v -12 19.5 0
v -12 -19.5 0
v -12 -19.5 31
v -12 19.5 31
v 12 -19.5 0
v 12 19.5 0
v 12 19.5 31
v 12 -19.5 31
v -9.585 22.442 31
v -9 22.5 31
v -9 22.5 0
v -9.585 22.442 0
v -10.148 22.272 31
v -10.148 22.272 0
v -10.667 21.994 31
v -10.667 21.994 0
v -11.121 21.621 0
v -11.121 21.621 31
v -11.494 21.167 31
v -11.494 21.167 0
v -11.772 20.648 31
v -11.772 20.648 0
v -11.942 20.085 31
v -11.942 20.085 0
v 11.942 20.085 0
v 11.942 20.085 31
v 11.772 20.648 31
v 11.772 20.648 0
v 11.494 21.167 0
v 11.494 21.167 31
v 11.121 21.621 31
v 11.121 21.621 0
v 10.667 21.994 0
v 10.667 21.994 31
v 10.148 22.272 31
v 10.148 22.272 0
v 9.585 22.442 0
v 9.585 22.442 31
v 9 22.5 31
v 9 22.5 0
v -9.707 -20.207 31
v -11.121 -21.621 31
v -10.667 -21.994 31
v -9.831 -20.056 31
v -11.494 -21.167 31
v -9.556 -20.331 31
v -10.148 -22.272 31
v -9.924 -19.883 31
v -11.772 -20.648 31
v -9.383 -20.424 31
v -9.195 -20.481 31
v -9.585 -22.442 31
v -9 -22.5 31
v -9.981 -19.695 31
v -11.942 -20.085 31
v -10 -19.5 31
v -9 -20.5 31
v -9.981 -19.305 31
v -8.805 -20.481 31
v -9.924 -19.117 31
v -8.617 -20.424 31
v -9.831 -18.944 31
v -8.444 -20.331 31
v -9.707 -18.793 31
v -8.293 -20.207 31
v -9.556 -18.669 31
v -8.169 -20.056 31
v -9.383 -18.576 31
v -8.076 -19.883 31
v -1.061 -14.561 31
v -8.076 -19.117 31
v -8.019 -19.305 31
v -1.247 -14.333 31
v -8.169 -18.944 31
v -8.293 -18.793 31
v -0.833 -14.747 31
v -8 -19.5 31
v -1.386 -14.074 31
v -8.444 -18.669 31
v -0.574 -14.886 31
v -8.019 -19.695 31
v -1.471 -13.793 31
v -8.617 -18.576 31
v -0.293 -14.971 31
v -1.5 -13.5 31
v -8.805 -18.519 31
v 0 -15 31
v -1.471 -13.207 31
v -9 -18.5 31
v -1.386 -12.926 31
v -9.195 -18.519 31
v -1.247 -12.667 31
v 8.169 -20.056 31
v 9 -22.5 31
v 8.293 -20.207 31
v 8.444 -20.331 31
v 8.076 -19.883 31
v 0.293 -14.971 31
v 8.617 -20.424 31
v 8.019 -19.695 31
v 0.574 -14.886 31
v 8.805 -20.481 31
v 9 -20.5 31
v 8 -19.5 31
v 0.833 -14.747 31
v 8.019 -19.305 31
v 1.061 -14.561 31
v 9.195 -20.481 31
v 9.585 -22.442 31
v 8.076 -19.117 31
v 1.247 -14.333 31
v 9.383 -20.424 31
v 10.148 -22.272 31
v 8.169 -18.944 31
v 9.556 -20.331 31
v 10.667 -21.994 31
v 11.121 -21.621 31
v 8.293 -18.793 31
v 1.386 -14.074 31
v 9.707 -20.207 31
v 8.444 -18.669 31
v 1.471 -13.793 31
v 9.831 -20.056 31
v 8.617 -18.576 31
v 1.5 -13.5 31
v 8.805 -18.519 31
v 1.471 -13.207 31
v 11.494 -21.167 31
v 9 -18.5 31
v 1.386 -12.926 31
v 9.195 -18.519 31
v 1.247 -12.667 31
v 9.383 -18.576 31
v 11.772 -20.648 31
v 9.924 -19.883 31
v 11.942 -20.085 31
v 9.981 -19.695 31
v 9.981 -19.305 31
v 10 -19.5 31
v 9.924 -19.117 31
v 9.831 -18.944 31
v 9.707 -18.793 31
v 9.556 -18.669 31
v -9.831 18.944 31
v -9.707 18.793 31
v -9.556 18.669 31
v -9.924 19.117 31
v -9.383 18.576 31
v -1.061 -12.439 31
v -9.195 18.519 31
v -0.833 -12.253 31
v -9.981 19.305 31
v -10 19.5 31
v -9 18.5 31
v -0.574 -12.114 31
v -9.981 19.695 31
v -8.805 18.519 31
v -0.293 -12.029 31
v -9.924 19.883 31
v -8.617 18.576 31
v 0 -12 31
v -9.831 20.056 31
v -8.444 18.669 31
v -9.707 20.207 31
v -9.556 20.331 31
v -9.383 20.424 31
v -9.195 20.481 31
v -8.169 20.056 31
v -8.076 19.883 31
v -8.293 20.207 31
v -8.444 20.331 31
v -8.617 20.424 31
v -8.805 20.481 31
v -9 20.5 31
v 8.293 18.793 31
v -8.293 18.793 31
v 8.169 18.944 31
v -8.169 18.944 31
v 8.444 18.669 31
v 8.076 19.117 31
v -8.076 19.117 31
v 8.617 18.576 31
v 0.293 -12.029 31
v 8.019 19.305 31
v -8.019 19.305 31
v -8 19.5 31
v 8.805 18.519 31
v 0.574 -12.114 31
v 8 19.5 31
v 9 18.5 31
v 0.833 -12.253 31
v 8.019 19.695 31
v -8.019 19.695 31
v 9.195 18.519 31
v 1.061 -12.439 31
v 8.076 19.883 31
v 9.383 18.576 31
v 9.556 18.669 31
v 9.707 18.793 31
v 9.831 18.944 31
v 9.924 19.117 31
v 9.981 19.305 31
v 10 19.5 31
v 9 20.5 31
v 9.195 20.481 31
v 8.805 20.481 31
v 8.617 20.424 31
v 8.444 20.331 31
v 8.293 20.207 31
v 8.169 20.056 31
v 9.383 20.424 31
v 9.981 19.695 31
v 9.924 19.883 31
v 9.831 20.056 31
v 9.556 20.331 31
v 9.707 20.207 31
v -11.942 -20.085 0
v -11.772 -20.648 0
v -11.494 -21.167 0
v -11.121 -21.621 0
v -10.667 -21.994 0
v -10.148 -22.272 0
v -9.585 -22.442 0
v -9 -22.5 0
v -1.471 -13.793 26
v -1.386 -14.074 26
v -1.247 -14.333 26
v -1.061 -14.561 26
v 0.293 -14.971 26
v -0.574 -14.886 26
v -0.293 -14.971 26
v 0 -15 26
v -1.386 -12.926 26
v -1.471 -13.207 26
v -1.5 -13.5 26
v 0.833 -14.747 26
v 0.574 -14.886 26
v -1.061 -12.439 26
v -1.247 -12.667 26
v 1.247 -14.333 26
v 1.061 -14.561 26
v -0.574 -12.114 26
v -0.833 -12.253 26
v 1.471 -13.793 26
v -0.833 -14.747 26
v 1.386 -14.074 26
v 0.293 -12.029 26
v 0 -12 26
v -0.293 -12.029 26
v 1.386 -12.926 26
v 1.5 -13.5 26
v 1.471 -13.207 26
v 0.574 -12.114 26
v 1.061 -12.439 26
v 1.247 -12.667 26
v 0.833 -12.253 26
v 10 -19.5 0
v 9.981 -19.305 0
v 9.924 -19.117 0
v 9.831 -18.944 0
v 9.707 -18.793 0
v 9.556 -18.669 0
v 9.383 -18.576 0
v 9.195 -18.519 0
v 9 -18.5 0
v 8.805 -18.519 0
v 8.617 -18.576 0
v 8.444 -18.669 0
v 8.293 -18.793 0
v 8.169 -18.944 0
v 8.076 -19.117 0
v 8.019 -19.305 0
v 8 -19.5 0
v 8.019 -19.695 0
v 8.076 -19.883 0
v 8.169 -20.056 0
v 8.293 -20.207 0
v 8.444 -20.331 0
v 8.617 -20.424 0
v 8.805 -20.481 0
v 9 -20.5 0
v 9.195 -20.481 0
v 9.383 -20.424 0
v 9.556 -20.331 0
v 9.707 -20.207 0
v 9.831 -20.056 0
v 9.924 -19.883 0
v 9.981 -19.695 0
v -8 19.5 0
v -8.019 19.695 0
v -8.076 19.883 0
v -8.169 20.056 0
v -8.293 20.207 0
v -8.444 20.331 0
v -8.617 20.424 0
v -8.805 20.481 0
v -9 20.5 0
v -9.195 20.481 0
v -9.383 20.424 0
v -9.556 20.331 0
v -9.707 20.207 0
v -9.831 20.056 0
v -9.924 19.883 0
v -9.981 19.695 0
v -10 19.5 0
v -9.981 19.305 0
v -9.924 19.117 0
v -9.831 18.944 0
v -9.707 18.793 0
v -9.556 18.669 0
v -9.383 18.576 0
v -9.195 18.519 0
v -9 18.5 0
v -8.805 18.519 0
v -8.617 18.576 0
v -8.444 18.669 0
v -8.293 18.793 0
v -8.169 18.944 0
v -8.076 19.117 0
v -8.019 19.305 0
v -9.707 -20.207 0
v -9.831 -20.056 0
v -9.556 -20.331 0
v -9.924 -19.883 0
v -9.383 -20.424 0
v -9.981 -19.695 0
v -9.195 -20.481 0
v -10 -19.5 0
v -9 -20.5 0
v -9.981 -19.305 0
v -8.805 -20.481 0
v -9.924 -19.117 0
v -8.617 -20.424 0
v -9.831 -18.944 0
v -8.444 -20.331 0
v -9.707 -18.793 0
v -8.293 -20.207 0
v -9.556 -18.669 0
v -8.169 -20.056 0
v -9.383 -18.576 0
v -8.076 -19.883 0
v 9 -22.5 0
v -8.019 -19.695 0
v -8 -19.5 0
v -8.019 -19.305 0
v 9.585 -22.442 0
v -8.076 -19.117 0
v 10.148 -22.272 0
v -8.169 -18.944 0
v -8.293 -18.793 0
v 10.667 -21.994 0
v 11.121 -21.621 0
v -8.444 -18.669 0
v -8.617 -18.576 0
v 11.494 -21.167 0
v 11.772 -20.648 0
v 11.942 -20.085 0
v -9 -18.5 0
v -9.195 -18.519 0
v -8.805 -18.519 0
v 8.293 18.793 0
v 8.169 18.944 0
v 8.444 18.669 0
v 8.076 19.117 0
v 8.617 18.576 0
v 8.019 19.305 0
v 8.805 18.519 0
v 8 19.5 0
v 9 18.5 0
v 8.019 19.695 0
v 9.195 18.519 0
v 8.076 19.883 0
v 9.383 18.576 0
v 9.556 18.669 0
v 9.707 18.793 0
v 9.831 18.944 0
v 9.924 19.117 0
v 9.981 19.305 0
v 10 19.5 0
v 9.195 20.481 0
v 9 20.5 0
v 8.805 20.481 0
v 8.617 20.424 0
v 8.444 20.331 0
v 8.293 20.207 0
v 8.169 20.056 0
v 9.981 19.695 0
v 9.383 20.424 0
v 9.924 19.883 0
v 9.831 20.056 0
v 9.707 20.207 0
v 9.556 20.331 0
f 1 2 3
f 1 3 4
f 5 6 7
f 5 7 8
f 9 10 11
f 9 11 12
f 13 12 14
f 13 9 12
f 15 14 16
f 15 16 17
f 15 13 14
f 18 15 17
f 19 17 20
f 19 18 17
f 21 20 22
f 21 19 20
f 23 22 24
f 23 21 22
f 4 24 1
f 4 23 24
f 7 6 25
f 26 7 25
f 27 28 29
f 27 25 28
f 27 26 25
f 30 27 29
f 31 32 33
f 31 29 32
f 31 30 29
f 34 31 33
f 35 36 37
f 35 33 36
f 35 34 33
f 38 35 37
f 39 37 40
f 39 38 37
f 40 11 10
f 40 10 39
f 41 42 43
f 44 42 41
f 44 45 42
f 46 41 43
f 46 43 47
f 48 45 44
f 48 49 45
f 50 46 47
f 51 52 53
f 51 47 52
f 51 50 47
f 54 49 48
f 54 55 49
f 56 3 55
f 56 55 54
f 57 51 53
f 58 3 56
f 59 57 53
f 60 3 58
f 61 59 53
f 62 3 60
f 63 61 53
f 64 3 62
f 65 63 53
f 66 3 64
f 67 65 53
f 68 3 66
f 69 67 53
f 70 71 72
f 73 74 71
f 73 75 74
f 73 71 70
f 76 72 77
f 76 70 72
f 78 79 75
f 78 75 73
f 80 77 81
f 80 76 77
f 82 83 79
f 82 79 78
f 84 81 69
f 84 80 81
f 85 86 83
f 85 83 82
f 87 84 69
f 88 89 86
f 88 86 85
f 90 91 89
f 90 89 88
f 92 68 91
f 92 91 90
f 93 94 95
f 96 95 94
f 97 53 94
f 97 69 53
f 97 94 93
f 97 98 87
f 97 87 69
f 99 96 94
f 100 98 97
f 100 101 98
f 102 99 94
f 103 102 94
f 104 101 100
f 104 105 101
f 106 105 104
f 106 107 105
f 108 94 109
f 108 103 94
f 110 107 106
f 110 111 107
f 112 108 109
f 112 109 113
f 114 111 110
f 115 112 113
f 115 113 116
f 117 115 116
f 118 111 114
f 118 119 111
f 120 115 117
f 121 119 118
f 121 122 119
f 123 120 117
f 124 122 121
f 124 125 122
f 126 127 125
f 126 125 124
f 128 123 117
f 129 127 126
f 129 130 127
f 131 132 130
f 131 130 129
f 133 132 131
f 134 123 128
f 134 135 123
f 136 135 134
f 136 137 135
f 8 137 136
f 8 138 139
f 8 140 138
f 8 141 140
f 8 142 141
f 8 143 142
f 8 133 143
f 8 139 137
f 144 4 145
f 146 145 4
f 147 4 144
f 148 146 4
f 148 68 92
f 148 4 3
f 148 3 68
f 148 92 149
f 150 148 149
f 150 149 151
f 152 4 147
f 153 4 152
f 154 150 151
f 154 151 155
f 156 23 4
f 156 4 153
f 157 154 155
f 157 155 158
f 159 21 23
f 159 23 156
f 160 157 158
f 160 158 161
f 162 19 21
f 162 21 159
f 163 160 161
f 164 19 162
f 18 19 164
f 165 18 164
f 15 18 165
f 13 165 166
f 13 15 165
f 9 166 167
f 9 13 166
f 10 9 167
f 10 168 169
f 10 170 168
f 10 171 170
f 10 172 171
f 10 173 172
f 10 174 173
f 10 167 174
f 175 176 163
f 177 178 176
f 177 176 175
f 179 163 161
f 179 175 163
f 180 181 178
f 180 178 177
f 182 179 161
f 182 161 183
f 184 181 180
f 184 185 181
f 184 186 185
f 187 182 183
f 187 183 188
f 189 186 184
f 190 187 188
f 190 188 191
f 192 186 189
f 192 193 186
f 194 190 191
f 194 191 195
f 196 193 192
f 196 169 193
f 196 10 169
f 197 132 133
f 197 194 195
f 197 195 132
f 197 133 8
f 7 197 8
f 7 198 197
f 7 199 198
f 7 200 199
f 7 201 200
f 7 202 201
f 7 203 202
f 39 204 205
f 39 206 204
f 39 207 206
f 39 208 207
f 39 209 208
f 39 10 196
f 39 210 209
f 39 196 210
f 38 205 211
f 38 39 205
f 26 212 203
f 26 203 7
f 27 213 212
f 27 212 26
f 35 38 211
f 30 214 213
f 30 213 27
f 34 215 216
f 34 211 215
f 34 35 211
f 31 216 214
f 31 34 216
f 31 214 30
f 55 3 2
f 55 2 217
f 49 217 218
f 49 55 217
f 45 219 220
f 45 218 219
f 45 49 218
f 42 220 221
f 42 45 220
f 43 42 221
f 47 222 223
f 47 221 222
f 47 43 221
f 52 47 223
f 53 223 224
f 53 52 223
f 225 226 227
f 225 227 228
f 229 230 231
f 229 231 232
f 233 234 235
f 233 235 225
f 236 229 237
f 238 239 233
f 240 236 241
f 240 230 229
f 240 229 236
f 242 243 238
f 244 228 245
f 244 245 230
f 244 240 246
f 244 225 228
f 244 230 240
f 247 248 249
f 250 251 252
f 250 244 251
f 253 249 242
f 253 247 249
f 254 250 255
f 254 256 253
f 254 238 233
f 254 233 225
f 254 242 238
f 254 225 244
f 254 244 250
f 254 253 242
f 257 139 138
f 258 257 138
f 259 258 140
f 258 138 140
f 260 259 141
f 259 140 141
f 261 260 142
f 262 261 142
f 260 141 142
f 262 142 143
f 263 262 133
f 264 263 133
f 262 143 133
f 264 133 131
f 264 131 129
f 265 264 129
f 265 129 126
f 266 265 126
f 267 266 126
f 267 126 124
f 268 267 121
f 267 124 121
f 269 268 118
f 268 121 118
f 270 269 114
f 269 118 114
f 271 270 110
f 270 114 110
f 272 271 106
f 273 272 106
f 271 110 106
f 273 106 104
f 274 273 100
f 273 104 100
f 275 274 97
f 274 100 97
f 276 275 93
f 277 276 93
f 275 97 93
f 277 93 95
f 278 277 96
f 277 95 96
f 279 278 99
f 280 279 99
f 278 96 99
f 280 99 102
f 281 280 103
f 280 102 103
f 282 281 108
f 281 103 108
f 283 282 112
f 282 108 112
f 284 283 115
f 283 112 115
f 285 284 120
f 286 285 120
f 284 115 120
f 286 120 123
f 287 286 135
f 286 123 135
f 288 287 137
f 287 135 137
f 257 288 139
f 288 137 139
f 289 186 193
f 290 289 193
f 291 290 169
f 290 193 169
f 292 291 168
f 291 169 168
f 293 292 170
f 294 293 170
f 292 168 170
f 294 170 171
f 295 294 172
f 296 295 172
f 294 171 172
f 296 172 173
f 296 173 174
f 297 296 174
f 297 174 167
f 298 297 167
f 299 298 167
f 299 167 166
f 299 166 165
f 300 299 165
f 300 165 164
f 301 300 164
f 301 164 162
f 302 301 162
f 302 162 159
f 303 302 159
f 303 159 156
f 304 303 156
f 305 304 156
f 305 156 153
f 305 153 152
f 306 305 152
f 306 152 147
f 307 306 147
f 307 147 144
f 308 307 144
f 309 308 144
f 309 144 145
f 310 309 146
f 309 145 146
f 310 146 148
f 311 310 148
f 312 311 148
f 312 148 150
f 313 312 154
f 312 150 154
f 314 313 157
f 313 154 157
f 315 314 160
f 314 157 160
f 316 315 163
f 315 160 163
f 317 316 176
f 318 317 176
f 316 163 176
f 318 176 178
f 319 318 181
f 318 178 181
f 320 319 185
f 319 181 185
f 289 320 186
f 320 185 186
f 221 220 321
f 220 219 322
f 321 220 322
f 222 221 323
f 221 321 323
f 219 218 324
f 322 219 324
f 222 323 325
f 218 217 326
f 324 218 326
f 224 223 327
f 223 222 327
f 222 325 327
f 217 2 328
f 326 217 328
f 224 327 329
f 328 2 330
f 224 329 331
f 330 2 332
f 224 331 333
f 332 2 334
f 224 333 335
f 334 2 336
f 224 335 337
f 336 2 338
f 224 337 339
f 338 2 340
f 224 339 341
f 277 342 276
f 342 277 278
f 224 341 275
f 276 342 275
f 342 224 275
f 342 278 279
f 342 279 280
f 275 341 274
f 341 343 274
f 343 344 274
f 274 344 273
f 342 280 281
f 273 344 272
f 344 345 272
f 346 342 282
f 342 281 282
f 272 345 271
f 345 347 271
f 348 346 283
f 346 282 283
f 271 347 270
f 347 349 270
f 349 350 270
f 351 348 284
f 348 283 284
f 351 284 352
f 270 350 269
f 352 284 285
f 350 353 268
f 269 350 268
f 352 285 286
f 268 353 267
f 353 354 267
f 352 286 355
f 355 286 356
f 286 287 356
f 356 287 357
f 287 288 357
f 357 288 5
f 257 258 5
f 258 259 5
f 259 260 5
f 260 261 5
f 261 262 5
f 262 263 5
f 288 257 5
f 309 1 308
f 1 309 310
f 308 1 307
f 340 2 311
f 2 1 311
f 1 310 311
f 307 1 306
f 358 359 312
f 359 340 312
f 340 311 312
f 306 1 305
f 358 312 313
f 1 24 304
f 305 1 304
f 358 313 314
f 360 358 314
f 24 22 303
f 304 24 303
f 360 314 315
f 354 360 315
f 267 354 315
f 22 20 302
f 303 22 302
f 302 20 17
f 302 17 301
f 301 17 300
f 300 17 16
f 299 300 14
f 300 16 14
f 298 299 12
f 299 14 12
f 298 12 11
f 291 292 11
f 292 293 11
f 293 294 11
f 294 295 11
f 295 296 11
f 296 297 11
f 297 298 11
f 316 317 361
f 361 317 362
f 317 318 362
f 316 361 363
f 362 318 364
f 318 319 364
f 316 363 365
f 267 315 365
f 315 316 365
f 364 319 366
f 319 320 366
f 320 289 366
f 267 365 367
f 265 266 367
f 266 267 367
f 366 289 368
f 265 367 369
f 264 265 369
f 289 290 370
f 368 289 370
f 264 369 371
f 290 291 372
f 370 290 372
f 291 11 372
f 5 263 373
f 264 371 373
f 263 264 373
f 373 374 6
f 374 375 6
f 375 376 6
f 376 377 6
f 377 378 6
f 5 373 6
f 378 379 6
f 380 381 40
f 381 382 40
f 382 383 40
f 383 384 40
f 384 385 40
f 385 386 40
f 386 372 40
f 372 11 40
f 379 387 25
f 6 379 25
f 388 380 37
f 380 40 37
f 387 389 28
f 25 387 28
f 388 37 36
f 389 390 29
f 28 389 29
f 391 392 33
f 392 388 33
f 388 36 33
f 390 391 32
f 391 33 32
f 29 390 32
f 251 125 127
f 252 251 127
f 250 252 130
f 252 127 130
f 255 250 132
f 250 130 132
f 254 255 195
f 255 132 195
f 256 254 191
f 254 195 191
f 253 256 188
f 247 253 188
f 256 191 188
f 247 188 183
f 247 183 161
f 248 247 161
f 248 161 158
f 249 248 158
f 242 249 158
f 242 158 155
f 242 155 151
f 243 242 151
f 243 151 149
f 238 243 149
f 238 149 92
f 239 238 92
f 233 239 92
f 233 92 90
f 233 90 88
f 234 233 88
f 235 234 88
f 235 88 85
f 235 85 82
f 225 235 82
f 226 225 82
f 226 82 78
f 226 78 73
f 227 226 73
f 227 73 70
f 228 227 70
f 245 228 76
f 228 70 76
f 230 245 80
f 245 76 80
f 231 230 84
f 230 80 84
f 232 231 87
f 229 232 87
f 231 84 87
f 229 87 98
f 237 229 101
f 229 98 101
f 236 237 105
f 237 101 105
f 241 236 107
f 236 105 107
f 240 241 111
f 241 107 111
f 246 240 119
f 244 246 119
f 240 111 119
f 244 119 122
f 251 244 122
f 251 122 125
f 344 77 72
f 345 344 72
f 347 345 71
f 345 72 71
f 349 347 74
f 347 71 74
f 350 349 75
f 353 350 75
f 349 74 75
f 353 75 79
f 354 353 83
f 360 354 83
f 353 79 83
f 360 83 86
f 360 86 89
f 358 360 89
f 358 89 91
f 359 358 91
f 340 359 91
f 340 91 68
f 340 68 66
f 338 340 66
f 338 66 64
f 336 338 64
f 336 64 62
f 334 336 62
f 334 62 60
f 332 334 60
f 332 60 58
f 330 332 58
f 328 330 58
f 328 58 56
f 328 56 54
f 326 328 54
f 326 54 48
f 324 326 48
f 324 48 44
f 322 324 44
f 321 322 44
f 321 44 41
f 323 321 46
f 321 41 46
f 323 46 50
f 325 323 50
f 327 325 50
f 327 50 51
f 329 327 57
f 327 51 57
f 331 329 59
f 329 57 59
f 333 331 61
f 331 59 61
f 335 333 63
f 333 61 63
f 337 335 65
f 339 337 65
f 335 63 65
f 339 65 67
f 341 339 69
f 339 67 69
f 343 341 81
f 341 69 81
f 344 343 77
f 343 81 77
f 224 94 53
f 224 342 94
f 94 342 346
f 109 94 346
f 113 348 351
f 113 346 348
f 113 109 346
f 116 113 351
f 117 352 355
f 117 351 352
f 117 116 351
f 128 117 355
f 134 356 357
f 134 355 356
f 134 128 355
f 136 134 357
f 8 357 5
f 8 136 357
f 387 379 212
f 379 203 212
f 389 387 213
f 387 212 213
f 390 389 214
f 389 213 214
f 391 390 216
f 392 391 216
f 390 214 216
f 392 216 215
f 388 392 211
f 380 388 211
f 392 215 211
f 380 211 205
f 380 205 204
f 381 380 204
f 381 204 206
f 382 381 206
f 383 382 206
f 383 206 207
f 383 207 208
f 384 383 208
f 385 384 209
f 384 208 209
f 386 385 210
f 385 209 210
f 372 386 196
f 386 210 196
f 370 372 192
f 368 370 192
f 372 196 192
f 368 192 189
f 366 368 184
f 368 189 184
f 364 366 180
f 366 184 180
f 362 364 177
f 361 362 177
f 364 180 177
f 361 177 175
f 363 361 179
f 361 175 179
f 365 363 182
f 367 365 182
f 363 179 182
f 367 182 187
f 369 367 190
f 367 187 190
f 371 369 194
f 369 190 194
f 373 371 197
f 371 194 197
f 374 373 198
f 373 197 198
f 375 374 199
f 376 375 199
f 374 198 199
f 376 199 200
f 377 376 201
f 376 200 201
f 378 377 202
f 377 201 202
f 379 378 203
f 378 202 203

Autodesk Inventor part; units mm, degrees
ref_plane "YZ Plane" through (0, 0, 0) normal (1, 0, 0) x (0, 1, 0)
ref_plane "XZ Plane" through (0, 0, 0) normal (0, 1, 0) x (-1, 0, 0)
ref_plane "XY Plane" through (0, 0, 0) normal (0, 0, 1) x (1, 0, 0)
sketch "Sketch1" plane through (0, 0, 0) normal (0, 0, 1) x (1, 0, 0)
  line L0 (-12, 22.5) -> (12, 22.5)
  line L1 (12, 22.5) -> (12, -22.5)
  line L2 (12, -22.5) -> (-12, -22.5)
  line L3 (-12, -22.5) -> (-12, 22.5)
  point P0 (0, 0)
  point P1 (12, 0)
  point P2 (0, 22.5)
  dimension "d0" = 24
  dimension "d1" = 45
extrude "Extrusion1" add sketch "Sketch1" along normal blind 31
fillet "Fillet1" radius 3 4 edges at (12, 22.5, 15.5) (-12, 22.5, 15.5) (12, -22.5, 15.5) (-12, -22.5, 15.5)
sketch "Sketch3" plane through (0, 0, 31) normal (0, 0, 1) x (1, 0, 0)
  line L0 (0, -22.5) -> (0, -13.5) construction
  circle A0 centre (0, -13.5) radius 1.5
  point P0 (0, 0)
  dimension "d8" = 9
  dimension "d9" = 3
extrude "Extrusion3" cut sketch "Sketch3" against normal blind 5
sketch "Sketch4" plane through (0, 0, 31) normal (0, 0, 1) x (1, 0, 0)
  circle A0 centre (-9, 19.5) radius 1
  circle A1 centre (9, 19.5) radius 1
  circle A2 centre (-9, -19.5) radius 1
  circle A3 centre (9, -19.5) radius 1
  line L0 (-12, 19.5) -> (-12, -19.5) projected
  line L1 (9, 22.5) -> (-9, 22.5) projected
  line L2 (12, -19.5) -> (12, 19.5) projected
  line L3 (-9, -22.5) -> (9, -22.5) projected
  point P0 (0, 0)
  dimension "d12" = 2
  dimension "d13" = 3
  dimension "d14" = 3
  dimension "d15" = 3
  dimension "d16" = 3
  dimension "d17" = 3
  dimension "d18" = 3
  dimension "d19" = 3
  dimension "d20" = 3
  dimension "d21" = 2
  dimension "d22" = 2
  dimension "d23" = 2
extrude "Extrusion4" cut sketch "Sketch4" against normal up to surface (31 mm away)
properties part number "herkulex"
